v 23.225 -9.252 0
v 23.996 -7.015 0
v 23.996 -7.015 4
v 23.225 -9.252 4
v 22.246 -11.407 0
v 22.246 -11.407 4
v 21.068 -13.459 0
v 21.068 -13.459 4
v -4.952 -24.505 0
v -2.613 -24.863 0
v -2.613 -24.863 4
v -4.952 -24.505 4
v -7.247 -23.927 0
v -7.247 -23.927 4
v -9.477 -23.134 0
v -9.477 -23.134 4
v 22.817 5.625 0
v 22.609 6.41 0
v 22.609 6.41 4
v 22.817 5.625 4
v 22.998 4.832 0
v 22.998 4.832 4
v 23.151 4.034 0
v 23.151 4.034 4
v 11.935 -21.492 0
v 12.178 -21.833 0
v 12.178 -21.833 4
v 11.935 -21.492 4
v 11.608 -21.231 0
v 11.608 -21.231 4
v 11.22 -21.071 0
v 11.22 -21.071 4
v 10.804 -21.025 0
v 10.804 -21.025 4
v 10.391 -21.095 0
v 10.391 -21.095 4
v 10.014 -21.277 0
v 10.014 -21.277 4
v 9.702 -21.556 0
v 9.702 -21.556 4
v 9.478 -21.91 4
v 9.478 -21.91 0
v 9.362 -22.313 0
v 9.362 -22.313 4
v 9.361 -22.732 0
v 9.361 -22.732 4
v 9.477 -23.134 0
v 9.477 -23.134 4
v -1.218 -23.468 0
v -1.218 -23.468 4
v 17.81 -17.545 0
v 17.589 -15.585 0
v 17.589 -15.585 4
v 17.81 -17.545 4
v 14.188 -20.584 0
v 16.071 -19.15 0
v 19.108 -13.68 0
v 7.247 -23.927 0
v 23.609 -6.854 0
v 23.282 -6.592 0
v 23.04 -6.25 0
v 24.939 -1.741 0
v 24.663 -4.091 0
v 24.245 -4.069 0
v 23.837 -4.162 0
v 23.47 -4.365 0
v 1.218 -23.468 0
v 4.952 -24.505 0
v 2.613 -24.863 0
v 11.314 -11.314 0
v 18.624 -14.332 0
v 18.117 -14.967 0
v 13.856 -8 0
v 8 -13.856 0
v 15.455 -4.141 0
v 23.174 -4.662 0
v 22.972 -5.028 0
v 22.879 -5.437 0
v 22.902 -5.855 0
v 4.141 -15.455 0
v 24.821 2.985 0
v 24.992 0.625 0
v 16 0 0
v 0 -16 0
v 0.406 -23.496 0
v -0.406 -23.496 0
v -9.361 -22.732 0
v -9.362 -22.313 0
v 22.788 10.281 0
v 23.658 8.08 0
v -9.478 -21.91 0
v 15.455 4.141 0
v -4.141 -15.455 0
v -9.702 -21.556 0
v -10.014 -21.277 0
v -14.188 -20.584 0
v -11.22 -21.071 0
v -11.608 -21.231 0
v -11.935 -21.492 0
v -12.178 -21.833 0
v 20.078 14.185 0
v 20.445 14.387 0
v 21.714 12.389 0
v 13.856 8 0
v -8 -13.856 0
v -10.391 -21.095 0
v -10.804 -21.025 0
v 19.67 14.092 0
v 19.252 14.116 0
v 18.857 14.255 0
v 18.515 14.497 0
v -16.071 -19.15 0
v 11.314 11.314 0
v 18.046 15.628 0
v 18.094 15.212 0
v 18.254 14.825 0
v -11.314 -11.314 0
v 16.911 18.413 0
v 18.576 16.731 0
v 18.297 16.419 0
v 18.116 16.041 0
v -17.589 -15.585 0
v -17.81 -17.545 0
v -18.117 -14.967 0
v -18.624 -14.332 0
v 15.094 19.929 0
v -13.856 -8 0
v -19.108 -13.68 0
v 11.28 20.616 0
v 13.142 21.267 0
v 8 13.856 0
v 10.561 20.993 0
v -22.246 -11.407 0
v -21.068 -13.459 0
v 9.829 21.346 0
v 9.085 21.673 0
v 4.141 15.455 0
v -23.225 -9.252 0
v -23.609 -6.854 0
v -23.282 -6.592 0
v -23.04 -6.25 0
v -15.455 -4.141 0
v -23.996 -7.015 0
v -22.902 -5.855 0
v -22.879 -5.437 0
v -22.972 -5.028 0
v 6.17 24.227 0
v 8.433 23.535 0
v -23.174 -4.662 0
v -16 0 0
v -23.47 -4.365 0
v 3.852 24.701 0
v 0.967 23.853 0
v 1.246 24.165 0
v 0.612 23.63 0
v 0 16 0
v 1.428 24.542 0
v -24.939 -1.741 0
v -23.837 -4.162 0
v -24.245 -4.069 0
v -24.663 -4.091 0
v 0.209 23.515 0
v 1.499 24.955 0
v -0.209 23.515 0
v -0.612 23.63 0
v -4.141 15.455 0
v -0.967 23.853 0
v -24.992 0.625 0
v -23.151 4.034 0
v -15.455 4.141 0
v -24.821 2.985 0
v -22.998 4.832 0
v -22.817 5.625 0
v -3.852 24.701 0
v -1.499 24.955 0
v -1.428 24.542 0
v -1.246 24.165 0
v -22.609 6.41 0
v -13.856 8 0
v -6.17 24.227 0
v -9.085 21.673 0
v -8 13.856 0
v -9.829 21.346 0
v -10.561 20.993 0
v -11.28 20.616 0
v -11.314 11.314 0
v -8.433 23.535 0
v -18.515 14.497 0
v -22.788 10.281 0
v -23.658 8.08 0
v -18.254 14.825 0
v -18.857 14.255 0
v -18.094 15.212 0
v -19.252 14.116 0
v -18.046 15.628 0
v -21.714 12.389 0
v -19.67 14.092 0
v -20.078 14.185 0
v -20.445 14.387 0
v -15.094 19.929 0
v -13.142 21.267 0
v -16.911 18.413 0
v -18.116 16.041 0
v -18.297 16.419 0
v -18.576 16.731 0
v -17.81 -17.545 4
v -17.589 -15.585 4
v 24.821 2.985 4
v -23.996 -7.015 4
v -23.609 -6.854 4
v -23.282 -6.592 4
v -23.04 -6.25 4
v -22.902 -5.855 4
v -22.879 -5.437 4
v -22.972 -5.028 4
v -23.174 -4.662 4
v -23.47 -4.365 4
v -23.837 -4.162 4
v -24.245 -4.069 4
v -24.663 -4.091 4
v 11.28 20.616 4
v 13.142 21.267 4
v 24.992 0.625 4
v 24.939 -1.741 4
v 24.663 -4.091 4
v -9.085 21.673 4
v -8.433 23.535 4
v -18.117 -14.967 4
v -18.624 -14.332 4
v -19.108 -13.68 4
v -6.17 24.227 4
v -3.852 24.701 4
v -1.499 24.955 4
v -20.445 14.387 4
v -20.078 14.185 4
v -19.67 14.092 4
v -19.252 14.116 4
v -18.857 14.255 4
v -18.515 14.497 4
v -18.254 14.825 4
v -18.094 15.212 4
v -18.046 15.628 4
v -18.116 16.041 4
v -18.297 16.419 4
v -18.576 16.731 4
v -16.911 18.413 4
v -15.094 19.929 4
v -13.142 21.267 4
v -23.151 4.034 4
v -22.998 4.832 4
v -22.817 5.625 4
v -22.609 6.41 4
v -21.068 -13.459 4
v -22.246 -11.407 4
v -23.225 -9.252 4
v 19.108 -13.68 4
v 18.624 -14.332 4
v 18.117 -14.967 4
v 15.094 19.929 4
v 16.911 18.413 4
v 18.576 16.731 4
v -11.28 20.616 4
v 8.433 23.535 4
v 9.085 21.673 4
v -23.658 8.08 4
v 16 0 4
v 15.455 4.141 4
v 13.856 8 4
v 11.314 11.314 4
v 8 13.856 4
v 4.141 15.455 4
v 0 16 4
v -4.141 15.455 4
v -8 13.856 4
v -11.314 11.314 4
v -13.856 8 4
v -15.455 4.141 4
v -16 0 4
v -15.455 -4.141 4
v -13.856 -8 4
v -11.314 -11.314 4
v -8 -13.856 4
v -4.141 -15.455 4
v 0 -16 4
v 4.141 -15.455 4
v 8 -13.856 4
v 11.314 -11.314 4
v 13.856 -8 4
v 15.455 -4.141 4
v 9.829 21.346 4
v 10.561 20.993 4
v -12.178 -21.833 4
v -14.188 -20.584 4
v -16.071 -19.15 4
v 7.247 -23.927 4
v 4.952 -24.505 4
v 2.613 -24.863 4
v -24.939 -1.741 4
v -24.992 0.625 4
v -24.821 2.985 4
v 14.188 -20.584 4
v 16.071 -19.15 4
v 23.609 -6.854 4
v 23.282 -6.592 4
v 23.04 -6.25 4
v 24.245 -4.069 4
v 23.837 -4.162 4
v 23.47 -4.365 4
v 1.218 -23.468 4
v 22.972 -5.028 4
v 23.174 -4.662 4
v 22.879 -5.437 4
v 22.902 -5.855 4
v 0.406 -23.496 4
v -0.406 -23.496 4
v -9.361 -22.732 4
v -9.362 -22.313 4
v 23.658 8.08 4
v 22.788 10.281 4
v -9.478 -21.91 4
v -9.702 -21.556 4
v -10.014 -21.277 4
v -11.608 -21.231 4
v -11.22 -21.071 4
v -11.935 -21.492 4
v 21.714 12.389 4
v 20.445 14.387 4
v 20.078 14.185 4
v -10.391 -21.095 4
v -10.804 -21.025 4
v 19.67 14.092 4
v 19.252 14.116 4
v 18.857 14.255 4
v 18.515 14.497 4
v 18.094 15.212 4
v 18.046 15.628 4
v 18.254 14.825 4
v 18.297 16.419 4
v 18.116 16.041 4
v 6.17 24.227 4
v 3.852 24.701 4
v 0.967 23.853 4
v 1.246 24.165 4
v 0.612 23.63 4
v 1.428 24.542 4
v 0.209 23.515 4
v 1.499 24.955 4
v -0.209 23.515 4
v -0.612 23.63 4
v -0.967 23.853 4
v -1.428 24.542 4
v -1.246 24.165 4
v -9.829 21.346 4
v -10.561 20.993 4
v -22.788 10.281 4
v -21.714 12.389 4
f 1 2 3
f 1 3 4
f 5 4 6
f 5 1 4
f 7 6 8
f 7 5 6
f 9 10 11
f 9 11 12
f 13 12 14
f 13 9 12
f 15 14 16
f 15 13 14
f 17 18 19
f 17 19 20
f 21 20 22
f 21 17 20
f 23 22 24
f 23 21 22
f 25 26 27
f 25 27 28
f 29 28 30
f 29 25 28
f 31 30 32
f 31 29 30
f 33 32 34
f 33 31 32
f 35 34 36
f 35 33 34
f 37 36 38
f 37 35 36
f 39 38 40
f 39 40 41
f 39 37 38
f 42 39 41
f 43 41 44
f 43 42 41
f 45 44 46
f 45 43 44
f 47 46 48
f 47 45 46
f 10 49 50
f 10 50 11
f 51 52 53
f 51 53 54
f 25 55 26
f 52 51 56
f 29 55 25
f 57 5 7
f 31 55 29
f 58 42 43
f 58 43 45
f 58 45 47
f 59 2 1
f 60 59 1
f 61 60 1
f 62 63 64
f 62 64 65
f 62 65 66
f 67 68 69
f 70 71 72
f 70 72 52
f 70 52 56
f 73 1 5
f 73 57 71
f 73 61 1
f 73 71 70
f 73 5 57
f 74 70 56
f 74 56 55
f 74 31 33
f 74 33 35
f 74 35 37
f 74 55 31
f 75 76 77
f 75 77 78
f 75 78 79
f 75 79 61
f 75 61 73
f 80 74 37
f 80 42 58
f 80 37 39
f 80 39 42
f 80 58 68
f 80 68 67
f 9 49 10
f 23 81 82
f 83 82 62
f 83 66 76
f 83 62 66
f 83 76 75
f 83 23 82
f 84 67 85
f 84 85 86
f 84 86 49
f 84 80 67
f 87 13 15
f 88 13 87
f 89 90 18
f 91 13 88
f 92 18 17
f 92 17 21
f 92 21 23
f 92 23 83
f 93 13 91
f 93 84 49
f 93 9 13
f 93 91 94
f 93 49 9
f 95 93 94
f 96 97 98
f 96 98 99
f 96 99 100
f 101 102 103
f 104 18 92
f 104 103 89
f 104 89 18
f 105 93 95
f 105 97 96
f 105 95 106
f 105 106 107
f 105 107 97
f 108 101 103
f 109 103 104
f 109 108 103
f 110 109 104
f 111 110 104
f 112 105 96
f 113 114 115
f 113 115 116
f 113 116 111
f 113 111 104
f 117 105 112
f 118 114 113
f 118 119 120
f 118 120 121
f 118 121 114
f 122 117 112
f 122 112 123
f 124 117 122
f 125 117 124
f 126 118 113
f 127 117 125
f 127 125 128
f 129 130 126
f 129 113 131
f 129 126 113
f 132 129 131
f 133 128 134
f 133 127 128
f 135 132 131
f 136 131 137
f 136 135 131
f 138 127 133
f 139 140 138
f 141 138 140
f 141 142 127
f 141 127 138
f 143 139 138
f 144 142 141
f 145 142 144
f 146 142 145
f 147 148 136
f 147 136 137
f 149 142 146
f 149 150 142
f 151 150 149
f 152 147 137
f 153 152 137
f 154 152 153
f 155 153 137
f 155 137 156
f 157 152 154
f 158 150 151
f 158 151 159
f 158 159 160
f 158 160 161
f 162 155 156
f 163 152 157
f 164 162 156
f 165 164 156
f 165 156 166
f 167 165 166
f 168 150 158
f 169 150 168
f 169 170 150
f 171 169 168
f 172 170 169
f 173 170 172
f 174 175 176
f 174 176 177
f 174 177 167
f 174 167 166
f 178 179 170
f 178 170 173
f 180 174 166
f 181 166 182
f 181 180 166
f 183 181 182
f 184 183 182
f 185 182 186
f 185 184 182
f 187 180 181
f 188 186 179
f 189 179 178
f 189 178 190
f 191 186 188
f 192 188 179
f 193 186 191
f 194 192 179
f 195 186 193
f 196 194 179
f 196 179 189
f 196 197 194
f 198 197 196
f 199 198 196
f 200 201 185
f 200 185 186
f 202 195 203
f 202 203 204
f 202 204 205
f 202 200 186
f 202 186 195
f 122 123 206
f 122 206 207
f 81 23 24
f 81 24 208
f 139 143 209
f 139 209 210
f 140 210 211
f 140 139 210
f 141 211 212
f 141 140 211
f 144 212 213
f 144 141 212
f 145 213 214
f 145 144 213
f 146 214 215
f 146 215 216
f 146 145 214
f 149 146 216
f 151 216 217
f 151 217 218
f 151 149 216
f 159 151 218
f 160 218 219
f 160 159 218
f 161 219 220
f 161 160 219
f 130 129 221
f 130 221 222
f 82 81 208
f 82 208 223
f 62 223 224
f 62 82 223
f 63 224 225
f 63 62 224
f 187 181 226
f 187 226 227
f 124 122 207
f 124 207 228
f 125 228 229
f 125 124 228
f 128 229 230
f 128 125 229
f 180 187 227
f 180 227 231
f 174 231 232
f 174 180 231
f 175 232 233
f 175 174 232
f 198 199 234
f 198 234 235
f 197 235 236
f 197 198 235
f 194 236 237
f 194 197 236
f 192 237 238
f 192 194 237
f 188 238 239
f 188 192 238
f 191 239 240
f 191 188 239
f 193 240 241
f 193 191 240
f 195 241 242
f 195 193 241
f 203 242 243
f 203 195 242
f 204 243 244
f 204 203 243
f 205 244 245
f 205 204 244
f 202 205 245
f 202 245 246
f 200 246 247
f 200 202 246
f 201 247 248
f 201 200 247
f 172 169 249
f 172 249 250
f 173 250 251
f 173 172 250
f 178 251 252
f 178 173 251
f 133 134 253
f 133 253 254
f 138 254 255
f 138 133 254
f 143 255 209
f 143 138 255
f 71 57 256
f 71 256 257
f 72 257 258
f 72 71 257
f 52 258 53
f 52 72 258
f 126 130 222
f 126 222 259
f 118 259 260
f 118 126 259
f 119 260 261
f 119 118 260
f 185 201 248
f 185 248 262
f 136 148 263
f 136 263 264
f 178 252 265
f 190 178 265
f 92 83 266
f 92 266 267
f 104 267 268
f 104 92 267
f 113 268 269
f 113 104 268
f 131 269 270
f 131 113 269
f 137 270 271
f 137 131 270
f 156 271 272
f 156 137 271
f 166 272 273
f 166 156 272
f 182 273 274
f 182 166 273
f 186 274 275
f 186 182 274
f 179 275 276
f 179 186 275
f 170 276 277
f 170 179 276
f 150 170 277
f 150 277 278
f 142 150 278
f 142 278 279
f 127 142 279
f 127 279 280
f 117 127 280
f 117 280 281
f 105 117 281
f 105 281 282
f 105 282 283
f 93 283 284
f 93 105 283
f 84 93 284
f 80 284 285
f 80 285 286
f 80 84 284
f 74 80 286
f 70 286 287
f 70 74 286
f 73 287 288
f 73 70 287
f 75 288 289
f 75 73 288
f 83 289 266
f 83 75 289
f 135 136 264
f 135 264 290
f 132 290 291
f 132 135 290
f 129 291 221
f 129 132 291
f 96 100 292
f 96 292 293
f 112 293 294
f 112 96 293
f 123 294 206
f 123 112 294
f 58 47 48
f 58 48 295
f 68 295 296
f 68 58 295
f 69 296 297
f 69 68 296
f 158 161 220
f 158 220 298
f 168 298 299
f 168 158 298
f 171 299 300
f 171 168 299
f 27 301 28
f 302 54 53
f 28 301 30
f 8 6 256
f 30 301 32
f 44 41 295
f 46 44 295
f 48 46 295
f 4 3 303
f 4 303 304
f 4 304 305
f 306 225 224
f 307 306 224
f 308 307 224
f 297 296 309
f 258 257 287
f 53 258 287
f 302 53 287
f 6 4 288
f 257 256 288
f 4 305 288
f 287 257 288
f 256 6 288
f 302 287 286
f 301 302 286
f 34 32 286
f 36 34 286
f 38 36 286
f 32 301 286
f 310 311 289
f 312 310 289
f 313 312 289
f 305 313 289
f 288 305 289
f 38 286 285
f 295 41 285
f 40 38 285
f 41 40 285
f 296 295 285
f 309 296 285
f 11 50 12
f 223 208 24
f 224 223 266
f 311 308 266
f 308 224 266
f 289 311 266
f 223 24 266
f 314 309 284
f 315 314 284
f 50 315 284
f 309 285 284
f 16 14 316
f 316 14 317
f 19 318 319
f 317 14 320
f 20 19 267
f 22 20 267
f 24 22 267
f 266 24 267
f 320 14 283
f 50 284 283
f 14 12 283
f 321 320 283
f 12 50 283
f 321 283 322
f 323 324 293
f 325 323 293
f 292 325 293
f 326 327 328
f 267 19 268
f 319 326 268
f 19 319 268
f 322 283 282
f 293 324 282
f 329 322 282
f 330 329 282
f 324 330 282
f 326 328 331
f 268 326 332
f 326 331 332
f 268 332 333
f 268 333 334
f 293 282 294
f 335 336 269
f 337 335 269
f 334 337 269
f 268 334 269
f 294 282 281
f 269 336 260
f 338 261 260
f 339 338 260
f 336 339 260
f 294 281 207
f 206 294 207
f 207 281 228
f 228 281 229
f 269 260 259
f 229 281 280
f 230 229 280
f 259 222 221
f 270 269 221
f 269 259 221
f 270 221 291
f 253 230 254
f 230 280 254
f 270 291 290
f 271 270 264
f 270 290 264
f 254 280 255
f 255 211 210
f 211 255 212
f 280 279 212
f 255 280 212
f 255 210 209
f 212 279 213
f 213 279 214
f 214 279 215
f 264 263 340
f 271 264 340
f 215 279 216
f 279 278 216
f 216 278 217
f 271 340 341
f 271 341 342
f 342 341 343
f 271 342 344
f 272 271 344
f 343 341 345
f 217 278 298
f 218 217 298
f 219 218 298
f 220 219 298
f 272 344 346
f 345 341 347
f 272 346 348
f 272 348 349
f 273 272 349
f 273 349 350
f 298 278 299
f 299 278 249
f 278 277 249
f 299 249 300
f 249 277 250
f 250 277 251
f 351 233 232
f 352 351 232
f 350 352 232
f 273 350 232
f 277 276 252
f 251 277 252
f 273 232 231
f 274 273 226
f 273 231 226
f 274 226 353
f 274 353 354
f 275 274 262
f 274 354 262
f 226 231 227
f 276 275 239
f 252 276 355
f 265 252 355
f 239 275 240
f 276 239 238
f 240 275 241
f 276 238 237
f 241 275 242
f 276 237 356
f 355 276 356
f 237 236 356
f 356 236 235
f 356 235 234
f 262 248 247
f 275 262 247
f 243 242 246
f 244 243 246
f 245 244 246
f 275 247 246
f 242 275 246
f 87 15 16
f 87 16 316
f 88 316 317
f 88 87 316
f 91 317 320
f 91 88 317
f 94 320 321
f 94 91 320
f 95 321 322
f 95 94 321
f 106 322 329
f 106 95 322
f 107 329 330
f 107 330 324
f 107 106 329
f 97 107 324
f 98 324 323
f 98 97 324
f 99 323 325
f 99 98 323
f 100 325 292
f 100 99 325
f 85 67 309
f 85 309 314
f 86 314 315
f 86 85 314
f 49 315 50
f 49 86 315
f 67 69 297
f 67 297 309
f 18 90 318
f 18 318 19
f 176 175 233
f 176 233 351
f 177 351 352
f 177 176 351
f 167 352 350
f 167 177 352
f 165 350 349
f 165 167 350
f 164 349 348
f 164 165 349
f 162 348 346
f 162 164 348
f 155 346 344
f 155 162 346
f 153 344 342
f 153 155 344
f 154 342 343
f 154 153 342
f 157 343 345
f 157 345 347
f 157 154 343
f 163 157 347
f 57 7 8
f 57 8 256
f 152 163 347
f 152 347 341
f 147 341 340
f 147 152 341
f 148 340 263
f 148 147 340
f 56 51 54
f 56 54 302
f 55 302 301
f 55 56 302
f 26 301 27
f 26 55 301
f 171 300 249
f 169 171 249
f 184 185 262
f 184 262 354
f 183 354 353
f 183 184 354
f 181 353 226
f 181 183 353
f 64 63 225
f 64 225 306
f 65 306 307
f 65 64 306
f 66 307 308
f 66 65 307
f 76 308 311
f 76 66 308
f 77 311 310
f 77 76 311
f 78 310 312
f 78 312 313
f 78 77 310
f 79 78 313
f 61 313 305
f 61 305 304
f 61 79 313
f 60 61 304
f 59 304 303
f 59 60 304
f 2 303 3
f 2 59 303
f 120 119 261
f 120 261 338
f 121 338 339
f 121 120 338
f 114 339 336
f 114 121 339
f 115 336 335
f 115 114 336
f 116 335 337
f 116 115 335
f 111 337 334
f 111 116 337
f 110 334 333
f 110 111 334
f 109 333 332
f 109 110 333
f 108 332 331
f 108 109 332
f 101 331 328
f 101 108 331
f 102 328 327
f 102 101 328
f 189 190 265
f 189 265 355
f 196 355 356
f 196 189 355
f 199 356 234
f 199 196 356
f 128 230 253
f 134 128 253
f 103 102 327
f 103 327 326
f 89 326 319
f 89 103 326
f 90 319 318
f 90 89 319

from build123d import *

# Parameters (mm, degrees)
SKETCH1_R           = 16
BOSS_EXTRUDE1_DEPTH = 4


with BuildPart() as part:
    # Sketch1 → Boss-Extrude1 (new body)
    with BuildSketch(Plane.XY):
        with BuildLine():
            Line((23.658232882, 8.080100055), (22.60887418, 6.410055249))
            ThreePointArc((22.60887418, 6.410055249), (22.910805936, 5.229241948), (23.151110514, 4.034362646))
            Line((23.151110514, 4.034362646), (24.821155321, 2.985003945))
            ThreePointArc((24.821155321, 2.985003945), (24.993754895, -0.558763162), (24.662957214, -4.091276263))
            ThreePointArc((24.662957214, -4.091276263), (22.910805936, -5.229241948), (23.995694883, -7.014743551))
            ThreePointArc((23.995694883, -7.014743551), (22.761033302, -10.340955615), (21.067943537, -13.458891304))
            Line((21.067943537, -13.458891304), (19.107985481, -13.679725541))
            ThreePointArc((19.107985481, -13.679725541), (18.373039838, -14.652010344), (17.588673036, -15.584883087))
            Line((17.588673036, -15.584883087), (17.809507272, -17.544841143))
            ThreePointArc((17.809507272, -17.544841143), (15.146492656, -19.889287575), (12.178413721, -21.833145427))
            ThreePointArc((12.178413721, -21.833145427), (10.196267869, -21.172768396), (9.476723699, -23.13421077))
            ThreePointArc((9.476723699, -23.13421077), (6.106387485, -24.242772776), (2.613063, -24.863063))
            Line((2.613063, -24.863063), (1.218393982, -23.468393982))
            ThreePointArc((1.218393982, -23.468393982), (0, -23.5), (-1.218393982, -23.468393982))
            Line((-1.218393982, -23.468393982), (-2.613063, -24.863063))
            ThreePointArc((-2.613063, -24.863063), (-6.106387485, -24.242772776), (-9.476723699, -23.13421077))
            ThreePointArc((-9.476723699, -23.13421077), (-10.196267869, -21.172768396), (-12.178413721, -21.833145427))
            ThreePointArc((-12.178413721, -21.833145427), (-15.146492656, -19.889287575), (-17.809507272, -17.544841143))
            Line((-17.809507272, -17.544841143), (-17.588673036, -15.584883087))
            ThreePointArc((-17.588673036, -15.584883087), (-18.373039838, -14.652010344), (-19.107985481, -13.679725541))
            Line((-19.107985481, -13.679725541), (-21.067943537, -13.458891304))
            ThreePointArc((-21.067943537, -13.458891304), (-22.761033302, -10.340955615), (-23.995694883, -7.014743551))
            ThreePointArc((-23.995694883, -7.014743551), (-22.910805936, -5.229241948), (-24.662957214, -4.091276263))
            ThreePointArc((-24.662957214, -4.091276263), (-24.993754895, -0.558763162), (-24.821155321, 2.985003945))
            Line((-24.821155321, 2.985003945), (-23.151110514, 4.034362646))
            ThreePointArc((-23.151110514, 4.034362646), (-22.910805936, 5.229241948), (-22.60887418, 6.410055249))
            Line((-22.60887418, 6.410055249), (-23.658232882, 8.080100055))
            ThreePointArc((-23.658232882, 8.080100055), (-22.276156802, 11.347812041), (-20.445418397, 14.386968637))
            ThreePointArc((-20.445418397, 14.386968637), (-18.373039838, 14.652010344), (-18.575790893, 16.731407374))
            ThreePointArc((-18.575790893, 16.731407374), (-16.020209918, 19.192521309), (-13.141967154, 21.267080179))
            Line((-13.141967154, 21.267080179), (-11.280289579, 20.615651021))
            ThreePointArc((-11.280289579, 20.615651021), (-10.196267869, 21.172768396), (-9.084819485, 21.672933694))
            Line((-9.084819485, 21.672933694), (-8.433390327, 23.534611269))
            ThreePointArc((-8.433390327, 23.534611269), (-5.01687988, 24.491445778), (-1.499324848, 24.955))
            ThreePointArc((-1.499324848, 24.955), (0, 23.5), (1.499324848, 24.955))
            ThreePointArc((1.499324848, 24.955), (5.01687988, 24.491445778), (8.433390327, 23.534611269))
            Line((8.433390327, 23.534611269), (9.084819485, 21.672933694))
            ThreePointArc((9.084819485, 21.672933694), (10.196267869, 21.172768396), (11.280289579, 20.615651021))
            Line((11.280289579, 20.615651021), (13.141967154, 21.267080179))
            ThreePointArc((13.141967154, 21.267080179), (16.020209918, 19.192521309), (18.575790893, 16.731407374))
            ThreePointArc((18.575790893, 16.731407374), (18.373039838, 14.652010344), (20.445418397, 14.386968637))
            ThreePointArc((20.445418397, 14.386968637), (22.276156802, 11.347812041), (23.658232882, 8.080100055))
        make_face()
        Circle(SKETCH1_R, mode=Mode.SUBTRACT)
    extrude(amount=BOSS_EXTRUDE1_DEPTH)


solid = part.part
